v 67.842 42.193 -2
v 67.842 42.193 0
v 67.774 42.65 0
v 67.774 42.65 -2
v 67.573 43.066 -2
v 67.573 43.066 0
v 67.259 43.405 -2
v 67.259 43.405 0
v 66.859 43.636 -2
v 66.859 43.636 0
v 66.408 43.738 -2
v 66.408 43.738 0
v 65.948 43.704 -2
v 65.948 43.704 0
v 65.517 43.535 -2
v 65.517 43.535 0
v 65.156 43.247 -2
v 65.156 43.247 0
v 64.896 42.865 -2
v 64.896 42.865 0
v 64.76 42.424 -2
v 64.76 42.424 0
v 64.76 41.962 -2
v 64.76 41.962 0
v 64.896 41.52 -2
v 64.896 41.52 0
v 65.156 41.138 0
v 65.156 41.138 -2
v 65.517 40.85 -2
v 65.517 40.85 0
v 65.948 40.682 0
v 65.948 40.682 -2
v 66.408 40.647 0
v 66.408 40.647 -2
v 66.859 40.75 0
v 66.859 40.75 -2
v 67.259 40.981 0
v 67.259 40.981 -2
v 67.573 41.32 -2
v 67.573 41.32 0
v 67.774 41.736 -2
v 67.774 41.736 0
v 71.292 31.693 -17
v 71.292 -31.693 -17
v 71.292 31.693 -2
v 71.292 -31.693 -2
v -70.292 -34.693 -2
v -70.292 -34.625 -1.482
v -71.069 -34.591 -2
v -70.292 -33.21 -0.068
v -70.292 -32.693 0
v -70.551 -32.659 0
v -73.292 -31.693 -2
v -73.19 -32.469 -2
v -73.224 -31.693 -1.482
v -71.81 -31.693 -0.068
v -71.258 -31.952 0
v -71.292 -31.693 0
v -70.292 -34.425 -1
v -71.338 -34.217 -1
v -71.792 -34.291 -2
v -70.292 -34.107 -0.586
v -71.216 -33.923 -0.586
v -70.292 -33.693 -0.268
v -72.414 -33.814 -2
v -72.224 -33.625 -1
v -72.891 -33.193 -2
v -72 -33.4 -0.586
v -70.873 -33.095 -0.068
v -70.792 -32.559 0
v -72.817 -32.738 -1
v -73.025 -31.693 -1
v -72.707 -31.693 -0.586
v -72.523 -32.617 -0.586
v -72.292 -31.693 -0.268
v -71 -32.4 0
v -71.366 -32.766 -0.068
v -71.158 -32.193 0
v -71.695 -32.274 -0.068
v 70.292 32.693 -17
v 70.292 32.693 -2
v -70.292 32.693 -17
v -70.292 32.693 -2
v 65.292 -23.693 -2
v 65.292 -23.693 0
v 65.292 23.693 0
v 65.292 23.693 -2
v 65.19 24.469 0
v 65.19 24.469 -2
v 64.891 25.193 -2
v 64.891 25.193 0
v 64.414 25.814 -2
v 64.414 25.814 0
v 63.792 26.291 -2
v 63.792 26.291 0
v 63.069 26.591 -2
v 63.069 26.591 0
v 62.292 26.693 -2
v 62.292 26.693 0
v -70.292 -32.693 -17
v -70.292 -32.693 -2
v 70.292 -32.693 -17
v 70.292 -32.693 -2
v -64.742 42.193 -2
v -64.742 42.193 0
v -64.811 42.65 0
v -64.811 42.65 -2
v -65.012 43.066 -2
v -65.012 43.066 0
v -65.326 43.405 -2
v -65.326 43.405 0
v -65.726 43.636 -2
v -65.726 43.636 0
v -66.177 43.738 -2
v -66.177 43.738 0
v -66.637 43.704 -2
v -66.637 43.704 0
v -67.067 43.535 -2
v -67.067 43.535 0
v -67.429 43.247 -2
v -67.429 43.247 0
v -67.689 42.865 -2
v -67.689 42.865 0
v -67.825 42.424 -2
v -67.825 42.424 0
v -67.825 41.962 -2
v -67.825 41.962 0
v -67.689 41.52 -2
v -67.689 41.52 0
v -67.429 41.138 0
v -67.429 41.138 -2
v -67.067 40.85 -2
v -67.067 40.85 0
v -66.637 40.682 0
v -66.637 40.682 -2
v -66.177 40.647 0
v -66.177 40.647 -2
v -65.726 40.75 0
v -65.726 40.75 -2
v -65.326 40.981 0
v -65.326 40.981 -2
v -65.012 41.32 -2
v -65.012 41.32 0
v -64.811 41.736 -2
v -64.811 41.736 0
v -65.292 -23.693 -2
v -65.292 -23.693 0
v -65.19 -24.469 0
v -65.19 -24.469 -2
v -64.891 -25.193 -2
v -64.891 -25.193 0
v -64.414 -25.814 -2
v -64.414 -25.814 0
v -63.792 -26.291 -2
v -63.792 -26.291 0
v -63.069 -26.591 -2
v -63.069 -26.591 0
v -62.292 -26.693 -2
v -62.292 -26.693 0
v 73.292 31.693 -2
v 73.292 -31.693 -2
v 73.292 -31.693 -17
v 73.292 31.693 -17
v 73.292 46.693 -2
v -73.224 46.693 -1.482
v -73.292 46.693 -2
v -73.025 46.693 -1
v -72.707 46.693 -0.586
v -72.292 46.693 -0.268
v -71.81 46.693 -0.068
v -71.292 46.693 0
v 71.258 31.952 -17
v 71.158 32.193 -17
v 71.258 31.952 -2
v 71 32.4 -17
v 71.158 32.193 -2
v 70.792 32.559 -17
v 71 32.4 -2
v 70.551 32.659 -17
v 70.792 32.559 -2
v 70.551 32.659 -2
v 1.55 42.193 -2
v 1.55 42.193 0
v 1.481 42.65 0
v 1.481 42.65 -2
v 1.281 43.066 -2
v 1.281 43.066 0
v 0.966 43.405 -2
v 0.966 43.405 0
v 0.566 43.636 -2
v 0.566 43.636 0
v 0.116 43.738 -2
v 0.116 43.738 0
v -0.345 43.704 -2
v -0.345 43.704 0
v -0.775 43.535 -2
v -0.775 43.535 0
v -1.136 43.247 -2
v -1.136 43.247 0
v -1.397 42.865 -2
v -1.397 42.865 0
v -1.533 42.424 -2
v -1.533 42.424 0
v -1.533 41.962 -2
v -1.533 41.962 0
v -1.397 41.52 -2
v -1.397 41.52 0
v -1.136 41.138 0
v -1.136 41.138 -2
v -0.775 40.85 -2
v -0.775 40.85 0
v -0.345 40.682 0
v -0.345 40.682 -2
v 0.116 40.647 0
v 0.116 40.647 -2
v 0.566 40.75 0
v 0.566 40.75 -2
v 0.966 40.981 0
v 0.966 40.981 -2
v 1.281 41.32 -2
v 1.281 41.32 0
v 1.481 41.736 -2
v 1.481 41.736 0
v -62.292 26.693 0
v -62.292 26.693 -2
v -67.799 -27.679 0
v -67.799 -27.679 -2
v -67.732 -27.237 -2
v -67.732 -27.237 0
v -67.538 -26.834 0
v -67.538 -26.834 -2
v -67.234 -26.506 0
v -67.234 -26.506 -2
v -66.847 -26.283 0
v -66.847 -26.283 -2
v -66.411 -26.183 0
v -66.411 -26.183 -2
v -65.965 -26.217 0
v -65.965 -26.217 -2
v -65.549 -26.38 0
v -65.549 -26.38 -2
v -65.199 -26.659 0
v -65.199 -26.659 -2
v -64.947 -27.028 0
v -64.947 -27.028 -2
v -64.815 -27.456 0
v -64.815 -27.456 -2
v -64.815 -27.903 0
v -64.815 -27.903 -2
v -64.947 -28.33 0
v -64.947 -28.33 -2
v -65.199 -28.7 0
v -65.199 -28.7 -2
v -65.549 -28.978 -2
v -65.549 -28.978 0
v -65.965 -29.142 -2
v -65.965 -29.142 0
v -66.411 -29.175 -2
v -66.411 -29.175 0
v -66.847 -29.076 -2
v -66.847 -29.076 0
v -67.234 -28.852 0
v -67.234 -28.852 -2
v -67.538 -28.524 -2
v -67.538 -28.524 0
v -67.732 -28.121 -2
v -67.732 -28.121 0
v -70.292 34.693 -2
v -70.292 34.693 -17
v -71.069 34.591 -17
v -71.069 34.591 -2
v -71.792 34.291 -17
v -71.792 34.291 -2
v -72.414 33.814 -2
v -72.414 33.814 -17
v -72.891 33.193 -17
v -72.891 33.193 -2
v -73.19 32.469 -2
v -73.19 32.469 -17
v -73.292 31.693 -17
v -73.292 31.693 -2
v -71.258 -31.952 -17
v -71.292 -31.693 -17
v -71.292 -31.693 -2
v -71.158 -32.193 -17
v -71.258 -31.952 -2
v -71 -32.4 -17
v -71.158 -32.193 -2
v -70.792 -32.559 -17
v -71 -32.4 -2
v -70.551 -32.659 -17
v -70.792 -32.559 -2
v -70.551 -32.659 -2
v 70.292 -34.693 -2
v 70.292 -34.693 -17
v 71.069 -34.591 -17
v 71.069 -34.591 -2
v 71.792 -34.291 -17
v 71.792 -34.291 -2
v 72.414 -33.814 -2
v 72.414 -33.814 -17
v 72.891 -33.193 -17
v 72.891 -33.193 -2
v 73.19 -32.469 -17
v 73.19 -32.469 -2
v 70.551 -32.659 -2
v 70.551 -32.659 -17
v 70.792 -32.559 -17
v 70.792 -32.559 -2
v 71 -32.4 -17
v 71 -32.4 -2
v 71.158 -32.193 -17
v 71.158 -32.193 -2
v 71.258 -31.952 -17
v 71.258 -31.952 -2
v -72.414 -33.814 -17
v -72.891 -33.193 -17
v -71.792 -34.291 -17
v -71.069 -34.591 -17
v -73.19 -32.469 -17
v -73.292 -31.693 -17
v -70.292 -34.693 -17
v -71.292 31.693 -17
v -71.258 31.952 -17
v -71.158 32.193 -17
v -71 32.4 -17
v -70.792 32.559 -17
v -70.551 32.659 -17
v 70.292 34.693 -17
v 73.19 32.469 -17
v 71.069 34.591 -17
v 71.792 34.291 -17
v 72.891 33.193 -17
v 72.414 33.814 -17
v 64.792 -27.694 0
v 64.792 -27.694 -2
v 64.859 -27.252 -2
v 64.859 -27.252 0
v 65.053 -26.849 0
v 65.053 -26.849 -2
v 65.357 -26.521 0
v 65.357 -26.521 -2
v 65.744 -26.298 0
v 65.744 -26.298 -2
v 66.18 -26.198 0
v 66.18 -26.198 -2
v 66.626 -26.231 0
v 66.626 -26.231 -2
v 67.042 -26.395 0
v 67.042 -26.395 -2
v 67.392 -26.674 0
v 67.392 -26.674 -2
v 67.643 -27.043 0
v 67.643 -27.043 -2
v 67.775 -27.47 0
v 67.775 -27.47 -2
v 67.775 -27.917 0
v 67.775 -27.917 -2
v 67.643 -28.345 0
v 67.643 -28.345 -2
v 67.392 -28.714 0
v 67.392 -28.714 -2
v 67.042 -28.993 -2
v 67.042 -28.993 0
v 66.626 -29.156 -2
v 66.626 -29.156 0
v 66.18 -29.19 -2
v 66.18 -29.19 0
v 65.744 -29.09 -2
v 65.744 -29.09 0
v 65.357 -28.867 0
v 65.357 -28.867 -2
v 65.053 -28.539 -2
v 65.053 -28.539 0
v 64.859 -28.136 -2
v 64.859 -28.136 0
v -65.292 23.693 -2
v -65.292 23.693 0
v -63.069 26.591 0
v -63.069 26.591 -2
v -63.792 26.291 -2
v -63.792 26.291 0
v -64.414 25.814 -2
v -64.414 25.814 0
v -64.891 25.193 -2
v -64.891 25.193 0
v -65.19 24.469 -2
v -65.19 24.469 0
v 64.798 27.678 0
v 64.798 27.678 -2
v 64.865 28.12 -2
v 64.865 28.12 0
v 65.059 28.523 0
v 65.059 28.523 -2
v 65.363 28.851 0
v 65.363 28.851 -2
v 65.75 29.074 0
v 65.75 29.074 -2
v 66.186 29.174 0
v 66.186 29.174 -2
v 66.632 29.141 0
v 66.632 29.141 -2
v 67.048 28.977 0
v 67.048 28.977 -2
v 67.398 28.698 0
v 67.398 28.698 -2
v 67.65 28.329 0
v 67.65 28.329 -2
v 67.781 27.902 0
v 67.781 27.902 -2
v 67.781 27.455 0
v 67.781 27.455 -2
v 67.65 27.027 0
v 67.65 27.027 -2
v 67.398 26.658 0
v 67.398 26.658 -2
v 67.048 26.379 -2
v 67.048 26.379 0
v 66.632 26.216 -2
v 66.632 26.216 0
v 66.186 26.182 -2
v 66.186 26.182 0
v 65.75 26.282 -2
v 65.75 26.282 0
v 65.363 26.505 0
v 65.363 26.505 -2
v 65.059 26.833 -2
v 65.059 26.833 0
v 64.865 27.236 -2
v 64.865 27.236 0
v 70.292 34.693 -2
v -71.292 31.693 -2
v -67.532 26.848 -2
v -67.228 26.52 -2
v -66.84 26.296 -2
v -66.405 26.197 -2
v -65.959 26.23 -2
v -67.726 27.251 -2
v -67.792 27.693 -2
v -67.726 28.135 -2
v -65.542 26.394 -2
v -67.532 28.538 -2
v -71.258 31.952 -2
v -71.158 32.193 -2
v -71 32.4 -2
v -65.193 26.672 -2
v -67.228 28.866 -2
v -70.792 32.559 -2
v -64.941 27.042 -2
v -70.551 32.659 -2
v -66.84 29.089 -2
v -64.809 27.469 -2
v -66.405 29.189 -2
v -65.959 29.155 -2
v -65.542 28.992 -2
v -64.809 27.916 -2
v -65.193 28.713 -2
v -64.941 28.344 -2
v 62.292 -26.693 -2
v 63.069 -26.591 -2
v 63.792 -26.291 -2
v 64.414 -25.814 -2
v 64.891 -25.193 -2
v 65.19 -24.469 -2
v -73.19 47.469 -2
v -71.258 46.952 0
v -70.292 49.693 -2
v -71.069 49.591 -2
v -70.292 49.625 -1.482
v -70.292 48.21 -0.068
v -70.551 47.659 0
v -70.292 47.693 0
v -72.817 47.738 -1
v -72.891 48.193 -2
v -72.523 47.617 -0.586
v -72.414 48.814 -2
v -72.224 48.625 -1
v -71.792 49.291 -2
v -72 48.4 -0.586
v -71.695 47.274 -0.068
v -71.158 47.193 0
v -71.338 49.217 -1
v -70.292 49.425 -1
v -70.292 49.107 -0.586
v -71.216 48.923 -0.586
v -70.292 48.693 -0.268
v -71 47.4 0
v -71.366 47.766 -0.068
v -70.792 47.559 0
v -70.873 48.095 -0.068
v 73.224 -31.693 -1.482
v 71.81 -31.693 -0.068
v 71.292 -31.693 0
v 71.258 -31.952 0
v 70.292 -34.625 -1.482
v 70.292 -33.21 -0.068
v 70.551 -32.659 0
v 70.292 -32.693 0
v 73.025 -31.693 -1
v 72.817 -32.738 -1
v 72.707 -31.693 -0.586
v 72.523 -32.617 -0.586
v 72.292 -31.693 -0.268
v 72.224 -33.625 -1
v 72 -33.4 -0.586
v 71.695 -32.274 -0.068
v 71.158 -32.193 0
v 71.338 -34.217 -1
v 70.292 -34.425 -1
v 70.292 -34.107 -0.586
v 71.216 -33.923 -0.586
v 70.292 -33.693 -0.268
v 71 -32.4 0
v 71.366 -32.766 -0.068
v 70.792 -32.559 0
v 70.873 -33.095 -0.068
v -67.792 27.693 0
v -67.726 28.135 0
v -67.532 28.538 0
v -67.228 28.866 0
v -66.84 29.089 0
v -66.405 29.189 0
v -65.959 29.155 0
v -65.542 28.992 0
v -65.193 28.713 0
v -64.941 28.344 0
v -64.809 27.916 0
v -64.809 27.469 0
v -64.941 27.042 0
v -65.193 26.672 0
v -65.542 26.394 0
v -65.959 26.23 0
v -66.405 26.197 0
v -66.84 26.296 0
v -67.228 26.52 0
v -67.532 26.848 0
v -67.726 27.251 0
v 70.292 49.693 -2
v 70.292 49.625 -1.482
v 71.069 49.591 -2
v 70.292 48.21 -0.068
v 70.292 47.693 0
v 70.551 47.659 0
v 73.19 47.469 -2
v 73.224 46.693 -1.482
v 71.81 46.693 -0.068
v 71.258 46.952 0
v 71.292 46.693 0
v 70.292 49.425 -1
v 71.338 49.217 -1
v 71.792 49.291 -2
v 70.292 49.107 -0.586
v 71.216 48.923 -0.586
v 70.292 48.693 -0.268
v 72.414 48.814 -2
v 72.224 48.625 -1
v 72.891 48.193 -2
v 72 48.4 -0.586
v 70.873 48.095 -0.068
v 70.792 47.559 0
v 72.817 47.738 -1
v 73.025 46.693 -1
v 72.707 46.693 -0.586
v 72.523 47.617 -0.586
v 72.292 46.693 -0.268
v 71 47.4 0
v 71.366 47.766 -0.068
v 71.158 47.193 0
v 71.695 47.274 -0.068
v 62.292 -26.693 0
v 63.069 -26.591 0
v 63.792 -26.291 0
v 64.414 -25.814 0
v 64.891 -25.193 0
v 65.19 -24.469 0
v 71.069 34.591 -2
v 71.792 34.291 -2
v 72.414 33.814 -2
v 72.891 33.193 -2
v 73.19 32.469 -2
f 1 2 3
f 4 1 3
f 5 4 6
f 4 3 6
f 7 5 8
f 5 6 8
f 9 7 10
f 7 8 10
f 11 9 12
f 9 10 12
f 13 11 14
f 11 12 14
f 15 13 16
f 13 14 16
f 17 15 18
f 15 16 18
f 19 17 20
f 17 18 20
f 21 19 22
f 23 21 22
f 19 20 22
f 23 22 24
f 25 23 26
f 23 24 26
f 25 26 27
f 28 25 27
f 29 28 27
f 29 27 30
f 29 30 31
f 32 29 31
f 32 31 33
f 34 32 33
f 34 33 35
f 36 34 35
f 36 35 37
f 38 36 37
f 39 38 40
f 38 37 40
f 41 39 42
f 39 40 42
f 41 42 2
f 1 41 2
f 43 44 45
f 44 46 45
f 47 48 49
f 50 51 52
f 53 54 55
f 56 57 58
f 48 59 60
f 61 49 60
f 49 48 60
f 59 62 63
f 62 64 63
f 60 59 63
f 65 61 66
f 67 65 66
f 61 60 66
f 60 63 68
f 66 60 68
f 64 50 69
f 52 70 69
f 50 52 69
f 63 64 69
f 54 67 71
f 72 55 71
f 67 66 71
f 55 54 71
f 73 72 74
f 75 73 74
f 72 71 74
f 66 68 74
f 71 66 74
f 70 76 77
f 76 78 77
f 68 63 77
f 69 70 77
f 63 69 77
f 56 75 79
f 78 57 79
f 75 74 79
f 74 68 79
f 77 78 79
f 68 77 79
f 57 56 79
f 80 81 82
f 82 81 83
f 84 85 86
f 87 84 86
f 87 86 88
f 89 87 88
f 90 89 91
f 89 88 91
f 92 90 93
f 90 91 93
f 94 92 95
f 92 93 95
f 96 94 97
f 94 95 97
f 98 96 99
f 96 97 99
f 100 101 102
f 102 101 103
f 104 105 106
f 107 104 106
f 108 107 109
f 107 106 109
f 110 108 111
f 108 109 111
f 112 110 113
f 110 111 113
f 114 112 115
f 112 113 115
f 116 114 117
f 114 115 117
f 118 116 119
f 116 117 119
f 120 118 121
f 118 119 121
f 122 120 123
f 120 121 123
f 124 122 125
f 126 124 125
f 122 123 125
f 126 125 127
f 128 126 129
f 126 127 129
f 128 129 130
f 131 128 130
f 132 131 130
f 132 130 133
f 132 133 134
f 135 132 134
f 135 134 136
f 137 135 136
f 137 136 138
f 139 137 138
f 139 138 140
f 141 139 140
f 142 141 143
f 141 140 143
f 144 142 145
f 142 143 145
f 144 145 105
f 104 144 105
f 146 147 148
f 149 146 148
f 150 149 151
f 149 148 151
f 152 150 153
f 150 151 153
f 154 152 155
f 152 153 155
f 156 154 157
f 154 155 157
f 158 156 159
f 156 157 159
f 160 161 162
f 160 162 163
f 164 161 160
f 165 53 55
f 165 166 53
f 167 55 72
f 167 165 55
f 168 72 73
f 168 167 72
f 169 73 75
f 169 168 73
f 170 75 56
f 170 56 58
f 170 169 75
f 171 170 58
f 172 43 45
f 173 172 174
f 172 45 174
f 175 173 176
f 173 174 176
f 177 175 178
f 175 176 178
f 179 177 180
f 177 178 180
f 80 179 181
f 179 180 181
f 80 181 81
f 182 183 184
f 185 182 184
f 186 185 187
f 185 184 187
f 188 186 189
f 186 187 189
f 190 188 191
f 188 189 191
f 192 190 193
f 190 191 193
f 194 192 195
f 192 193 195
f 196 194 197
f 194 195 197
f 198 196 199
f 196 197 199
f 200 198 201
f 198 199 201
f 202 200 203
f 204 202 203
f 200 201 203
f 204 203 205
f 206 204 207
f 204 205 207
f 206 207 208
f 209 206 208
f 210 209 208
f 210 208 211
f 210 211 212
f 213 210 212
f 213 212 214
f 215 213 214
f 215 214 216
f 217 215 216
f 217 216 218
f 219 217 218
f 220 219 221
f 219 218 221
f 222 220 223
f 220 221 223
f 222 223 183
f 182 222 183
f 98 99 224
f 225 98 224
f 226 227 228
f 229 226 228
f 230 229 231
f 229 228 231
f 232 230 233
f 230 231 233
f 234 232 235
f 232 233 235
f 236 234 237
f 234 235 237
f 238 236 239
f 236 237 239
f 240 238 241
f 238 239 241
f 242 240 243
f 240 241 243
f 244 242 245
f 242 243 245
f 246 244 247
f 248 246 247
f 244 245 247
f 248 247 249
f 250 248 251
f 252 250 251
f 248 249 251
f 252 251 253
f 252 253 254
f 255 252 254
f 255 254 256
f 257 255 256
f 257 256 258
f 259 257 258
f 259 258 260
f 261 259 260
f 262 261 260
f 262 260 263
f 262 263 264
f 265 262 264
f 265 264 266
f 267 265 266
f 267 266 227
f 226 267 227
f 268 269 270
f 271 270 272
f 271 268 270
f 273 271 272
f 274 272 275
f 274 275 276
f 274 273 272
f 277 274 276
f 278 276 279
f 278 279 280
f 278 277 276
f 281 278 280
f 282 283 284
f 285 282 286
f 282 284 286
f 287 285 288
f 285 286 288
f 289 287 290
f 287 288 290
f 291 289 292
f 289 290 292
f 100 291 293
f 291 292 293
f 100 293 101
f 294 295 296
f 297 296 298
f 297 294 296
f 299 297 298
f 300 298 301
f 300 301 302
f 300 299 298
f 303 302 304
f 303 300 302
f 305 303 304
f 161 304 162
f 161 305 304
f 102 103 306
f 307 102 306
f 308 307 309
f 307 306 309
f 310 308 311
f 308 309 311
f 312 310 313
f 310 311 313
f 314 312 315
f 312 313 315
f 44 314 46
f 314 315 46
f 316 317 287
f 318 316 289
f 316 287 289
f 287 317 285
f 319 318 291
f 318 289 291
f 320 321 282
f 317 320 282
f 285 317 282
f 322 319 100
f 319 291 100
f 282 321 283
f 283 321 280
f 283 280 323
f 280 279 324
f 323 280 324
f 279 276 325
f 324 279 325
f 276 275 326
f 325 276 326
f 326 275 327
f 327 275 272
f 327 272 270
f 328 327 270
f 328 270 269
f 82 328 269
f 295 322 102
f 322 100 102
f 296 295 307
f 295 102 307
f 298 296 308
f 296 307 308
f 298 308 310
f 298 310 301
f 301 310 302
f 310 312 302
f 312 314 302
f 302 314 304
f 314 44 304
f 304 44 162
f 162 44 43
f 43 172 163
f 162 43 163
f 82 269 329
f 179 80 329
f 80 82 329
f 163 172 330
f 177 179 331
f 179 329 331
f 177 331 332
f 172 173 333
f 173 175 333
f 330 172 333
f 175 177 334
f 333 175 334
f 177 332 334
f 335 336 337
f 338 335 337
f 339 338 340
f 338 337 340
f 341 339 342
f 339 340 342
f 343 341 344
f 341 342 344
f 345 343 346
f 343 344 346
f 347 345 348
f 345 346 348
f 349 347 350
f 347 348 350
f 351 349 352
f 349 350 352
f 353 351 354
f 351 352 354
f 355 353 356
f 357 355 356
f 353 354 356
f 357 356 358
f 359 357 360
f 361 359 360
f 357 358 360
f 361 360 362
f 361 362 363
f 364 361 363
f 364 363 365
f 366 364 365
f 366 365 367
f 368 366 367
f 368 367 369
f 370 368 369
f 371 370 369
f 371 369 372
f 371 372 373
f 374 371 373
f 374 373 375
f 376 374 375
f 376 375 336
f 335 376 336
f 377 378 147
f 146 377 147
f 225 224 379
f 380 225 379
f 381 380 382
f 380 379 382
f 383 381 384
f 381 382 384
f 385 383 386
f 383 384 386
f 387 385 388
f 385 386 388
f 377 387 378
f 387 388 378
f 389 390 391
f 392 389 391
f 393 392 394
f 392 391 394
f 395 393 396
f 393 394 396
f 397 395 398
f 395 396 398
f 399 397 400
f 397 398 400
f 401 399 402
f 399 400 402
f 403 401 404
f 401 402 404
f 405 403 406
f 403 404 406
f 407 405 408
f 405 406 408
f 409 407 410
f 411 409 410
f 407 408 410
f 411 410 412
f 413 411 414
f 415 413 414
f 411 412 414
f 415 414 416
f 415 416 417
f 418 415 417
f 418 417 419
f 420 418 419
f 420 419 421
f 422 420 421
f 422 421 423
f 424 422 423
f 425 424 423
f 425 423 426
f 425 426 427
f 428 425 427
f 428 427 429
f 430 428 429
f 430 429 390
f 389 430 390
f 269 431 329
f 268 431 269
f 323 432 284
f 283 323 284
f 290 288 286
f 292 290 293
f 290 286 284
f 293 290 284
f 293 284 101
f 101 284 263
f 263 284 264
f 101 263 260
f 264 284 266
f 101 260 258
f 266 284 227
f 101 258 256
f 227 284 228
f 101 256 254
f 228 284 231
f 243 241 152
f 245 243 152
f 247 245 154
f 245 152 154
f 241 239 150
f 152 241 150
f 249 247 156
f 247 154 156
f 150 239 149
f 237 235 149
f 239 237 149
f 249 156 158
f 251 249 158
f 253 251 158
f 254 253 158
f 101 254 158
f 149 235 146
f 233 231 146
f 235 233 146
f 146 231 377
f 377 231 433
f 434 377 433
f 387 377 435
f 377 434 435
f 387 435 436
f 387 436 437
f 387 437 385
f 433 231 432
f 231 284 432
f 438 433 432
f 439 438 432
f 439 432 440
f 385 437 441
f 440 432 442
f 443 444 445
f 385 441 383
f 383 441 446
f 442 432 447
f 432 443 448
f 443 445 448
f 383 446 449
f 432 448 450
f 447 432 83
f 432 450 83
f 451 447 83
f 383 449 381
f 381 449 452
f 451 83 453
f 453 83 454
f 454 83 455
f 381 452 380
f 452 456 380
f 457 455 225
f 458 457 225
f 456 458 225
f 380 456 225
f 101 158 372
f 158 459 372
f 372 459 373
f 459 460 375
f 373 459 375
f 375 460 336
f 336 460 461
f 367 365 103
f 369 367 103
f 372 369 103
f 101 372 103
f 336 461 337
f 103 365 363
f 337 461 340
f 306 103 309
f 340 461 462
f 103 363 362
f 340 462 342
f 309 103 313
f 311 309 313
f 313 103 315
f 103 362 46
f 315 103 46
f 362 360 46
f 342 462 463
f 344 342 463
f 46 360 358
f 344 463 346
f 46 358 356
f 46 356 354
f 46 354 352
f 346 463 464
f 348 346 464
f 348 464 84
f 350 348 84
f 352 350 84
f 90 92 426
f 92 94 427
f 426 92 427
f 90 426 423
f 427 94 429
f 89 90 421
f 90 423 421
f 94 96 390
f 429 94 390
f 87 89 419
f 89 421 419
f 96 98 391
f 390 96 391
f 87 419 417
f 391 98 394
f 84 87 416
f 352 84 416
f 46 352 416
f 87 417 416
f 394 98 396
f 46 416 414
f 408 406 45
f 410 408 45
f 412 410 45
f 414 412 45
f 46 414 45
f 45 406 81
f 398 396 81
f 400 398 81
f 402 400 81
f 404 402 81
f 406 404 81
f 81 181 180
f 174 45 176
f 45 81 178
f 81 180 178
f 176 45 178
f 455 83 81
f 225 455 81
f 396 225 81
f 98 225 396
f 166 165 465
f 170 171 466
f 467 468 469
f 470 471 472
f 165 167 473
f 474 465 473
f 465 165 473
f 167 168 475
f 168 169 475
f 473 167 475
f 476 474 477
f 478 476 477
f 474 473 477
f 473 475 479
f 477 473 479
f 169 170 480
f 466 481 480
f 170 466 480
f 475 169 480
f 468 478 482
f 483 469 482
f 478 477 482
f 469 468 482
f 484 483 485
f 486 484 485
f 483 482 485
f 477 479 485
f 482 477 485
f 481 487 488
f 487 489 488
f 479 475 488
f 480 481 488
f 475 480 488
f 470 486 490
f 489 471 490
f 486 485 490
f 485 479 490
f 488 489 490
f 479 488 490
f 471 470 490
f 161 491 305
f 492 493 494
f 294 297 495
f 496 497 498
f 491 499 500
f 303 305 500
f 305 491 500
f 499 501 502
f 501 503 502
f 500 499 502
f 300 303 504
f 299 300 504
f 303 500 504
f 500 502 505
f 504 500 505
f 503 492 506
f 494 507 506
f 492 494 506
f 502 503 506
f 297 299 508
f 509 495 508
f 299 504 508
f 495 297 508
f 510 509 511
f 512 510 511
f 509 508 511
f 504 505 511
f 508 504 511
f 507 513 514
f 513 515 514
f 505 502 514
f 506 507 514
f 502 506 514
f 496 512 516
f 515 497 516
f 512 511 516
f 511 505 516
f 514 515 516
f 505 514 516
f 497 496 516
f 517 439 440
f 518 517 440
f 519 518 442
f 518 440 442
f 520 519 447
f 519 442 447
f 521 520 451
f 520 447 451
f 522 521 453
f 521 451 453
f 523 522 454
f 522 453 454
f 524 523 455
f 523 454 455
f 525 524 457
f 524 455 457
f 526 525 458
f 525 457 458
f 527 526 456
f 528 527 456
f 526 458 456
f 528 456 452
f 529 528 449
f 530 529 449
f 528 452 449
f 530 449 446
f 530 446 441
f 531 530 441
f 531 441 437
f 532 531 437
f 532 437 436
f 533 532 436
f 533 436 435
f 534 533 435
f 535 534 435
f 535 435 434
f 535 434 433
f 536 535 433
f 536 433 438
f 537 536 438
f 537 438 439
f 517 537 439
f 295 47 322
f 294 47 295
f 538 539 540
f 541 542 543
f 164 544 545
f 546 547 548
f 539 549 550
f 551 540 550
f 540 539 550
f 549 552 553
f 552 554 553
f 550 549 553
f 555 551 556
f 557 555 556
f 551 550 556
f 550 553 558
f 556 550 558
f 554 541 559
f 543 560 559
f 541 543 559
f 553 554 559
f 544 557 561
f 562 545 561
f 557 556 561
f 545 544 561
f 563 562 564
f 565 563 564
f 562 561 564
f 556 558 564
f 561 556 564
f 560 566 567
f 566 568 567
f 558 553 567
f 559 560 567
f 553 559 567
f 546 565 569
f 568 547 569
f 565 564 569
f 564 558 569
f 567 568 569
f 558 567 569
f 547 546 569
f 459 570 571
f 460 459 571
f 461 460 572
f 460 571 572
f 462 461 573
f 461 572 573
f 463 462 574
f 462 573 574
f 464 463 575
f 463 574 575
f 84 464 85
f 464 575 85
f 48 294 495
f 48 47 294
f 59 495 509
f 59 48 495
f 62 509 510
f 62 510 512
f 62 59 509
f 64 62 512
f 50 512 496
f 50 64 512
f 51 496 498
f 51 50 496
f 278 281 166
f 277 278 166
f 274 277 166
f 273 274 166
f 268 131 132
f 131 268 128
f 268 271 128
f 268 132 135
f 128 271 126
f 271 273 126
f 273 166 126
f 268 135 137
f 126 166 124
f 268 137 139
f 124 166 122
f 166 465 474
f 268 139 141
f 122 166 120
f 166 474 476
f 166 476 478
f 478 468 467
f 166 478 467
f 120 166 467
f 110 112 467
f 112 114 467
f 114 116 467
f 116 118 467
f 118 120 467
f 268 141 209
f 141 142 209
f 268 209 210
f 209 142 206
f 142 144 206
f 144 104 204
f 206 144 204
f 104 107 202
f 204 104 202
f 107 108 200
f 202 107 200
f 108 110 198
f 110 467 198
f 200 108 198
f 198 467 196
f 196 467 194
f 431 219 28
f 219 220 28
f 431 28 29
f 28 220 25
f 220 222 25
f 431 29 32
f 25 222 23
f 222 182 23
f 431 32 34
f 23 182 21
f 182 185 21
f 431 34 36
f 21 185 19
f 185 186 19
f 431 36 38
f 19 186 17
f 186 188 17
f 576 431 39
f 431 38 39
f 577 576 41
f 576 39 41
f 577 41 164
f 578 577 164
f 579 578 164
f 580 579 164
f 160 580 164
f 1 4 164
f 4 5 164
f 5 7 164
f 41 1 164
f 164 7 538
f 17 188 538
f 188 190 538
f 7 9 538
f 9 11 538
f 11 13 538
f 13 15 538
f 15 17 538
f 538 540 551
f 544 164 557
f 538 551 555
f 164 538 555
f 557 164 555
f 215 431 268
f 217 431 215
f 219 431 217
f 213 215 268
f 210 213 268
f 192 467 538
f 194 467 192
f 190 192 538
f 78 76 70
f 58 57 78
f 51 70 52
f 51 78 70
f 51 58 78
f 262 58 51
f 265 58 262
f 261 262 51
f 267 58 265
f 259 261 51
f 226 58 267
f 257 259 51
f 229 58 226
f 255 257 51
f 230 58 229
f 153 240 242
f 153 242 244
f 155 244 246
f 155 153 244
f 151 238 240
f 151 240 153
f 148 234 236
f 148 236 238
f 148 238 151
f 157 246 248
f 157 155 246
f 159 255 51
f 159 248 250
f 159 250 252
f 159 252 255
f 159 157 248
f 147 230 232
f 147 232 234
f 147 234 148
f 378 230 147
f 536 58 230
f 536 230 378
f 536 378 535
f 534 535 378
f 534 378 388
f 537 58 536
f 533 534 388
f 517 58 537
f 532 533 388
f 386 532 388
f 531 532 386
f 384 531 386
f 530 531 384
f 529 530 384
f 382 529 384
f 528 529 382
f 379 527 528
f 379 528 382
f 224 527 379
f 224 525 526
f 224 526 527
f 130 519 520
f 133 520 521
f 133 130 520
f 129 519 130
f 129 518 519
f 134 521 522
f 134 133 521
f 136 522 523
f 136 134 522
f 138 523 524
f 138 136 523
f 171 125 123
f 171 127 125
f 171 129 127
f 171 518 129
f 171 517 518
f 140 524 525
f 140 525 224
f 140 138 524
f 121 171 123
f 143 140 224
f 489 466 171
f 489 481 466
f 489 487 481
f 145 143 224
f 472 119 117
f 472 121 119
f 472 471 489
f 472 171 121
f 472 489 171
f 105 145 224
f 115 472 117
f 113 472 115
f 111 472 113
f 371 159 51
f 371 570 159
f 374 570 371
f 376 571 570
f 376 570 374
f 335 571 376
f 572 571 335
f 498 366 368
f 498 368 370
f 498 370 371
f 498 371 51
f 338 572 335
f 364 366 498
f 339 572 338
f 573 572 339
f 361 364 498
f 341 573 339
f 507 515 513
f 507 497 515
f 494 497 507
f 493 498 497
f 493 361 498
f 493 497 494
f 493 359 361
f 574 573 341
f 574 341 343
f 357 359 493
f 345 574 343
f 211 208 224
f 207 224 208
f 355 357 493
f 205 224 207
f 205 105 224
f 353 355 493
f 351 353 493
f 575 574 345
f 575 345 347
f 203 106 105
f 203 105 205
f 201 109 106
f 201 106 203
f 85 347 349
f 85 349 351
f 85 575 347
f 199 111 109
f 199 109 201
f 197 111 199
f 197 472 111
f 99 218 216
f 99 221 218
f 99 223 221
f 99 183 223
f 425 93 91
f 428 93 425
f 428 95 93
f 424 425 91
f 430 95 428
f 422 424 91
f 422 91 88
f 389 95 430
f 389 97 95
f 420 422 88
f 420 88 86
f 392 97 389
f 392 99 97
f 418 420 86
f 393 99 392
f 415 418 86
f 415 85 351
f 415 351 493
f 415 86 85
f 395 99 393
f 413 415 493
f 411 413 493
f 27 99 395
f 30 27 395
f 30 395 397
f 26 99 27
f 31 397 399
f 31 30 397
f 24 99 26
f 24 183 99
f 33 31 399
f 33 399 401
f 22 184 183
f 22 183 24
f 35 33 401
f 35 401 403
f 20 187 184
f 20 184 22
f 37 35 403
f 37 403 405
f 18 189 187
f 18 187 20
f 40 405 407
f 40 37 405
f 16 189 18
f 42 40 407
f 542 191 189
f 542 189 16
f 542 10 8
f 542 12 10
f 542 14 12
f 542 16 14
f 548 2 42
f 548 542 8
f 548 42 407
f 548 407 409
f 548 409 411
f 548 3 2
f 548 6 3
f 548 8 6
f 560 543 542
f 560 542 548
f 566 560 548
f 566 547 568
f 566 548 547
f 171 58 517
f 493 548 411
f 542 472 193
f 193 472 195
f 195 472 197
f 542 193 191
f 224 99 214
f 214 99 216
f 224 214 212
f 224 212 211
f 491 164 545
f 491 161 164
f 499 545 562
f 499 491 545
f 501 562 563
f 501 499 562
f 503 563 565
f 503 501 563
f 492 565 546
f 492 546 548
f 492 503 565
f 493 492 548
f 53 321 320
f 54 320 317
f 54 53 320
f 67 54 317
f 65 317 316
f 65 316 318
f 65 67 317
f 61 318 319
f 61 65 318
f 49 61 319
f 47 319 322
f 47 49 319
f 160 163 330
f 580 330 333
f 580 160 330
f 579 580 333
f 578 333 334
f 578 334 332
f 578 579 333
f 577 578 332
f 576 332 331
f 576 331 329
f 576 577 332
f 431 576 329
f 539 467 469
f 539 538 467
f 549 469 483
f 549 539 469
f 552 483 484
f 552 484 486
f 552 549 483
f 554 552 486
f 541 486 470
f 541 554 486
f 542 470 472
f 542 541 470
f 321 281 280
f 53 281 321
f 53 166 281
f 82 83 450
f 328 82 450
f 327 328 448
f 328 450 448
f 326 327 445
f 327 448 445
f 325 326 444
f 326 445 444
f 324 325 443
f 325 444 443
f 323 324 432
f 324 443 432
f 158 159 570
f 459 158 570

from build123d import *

# Parameters (mm, degrees)
F2_DEPTH = 17
F3_T     = -2
F1_R     = 1.55
F4_DEPTH = 2
F5_DEPTH = 25
F6_D     = 3
F7_R     = 1.99999


# Not quite as in the source:
# - a fillet or chamfer is up to 0.001 mm smaller than in the source, because OpenCascade refuses the exact size


with BuildPart() as f2:
    # F1 (on Top) → F2 (new body)
    with BuildSketch(Plane.XY):
        with BuildLine():
            ThreePointArc((73.2924652381, 31.6927541938), (72.4137855817, 33.8140745374), (70.2924652381, 34.6927541938))
            Line((70.2924652381, 34.6927541938), (-70.2924652381, 34.6927541938))
            ThreePointArc((-70.2924652381, 34.6927541938), (-72.4137855817, 33.8140745374), (-73.2924652381, 31.6927541938))
            Line((-73.2924652381, 31.6927541938), (-73.2924652381, -31.6927541938))
            ThreePointArc((-73.2924652381, -31.6927541938), (-72.4137855817, -33.8140745374), (-70.2924652381, -34.6927541938))
            Line((-70.2924652381, -34.6927541938), (70.2924652381, -34.6927541938))
            ThreePointArc((70.2924652381, -34.6927541938), (72.4137855817, -33.8140745374), (73.2924652381, -31.6927541938))
            Line((73.2924652381, -31.6927541938), (73.2924652381, 31.6927541938))
        make_face()
        with BuildLine():
            ThreePointArc((65.2924652381, -23.6927541938), (64.4137855817, -25.8140745374), (62.2924652381, -26.6927541938))
            Line((62.2924652381, -26.6927541938), (-62.2924652381, -26.6927541938))
            ThreePointArc((-62.2924652381, -26.6927541938), (-64.4137855817, -25.8140745374), (-65.2924652381, -23.6927541938))
            Line((-65.2924652381, -23.6927541938), (-65.2924652381, 23.6927541938))
            ThreePointArc((-65.2924652381, 23.6927541938), (-64.4137855817, 25.8140745374), (-62.2924652381, 26.6927541938))
            Line((-62.2924652381, 26.6927541938), (62.2924652381, 26.6927541938))
            ThreePointArc((62.2924652381, 26.6927541938), (64.4137855817, 25.8140745374), (65.2924652381, 23.6927541938))
            Line((65.2924652381, 23.6927541938), (65.2924652381, -23.6927541938))
        make_face(mode=Mode.SUBTRACT)
        with BuildLine():
            Line((-62.2924652381, -26.6927541938), (62.2924652381, -26.6927541938))
            ThreePointArc((62.2924652381, -26.6927541938), (64.4137855817, -25.8140745374), (65.2924652381, -23.6927541938))
            Line((65.2924652381, -23.6927541938), (65.2924652381, 23.6927541938))
            ThreePointArc((65.2924652381, 23.6927541938), (64.4137855817, 25.8140745374), (62.2924652381, 26.6927541938))
            Line((62.2924652381, 26.6927541938), (-62.2924652381, 26.6927541938))
            ThreePointArc((-62.2924652381, 26.6927541938), (-64.4137855817, 25.8140745374), (-65.2924652381, 23.6927541938))
            Line((-65.2924652381, 23.6927541938), (-65.2924652381, -23.6927541938))
            ThreePointArc((-65.2924652381, -23.6927541938), (-64.4137855817, -25.8140745374), (-62.2924652381, -26.6927541938))
        make_face()
    extrude(amount=-F2_DEPTH)

    # F3
    f3_openings = [f2.faces().sort_by_distance(p)[0] for p in [
        (0, 0, -17),
    ]]
    offset(amount=F3_T, openings=f3_openings)

    # F1 (on Top) → F4 (join)
    with BuildSketch(Plane.XY):
        with BuildLine():
            Line((-70.2924652381, 34.6927541938), (70.2924652381, 34.6927541938))
            ThreePointArc((70.2924652381, 34.6927541938), (72.4137855817, 33.8140745374), (73.2924652381, 31.6927541938))
            Line((73.2924652381, 31.6927541938), (73.2924652381, 34.6927541938))
            Line((73.2924652381, 34.6927541938), (73.2924652381, 46.6927541938))
            ThreePointArc((73.2924652381, 46.6927541938), (72.4137855817, 48.8140745374), (70.2924652381, 49.6927541938))
            Line((70.2924652381, 49.6927541938), (-70.2924652381, 49.6927541938))
            ThreePointArc((-70.2924652381, 49.6927541938), (-72.4137855817, 48.8140745374), (-73.2924652381, 46.6927541938))
            Line((-73.2924652381, 46.6927541938), (-73.2924652381, 34.6927541938))
            Line((-73.2924652381, 34.6927541938), (-73.2924652381, 31.6927541938))
            ThreePointArc((-73.2924652381, 31.6927541938), (-72.4137855817, 33.8140745374), (-70.2924652381, 34.6927541938))
        make_face()
        with Locations((-66.2924652381, 42.1927541938)):
            Circle(F1_R, mode=Mode.SUBTRACT)
        with Locations((0, 42.1927541938)):
            Circle(F1_R, mode=Mode.SUBTRACT)
        with Locations((66.2924652381, 42.1927541938)):
            Circle(F1_R, mode=Mode.SUBTRACT)
    extrude(amount=-F4_DEPTH)

    # F1 (on Top) → F5 (cut)
    with BuildSketch(Plane.XY):
        with BuildLine():
            Line((-62.2924652381, -26.6927541938), (62.2924652381, -26.6927541938))
            ThreePointArc((62.2924652381, -26.6927541938), (64.4137855817, -25.8140745374), (65.2924652381, -23.6927541938))
            Line((65.2924652381, -23.6927541938), (65.2924652381, 23.6927541938))
            ThreePointArc((65.2924652381, 23.6927541938), (64.4137855817, 25.8140745374), (62.2924652381, 26.6927541938))
            Line((62.2924652381, 26.6927541938), (-62.2924652381, 26.6927541938))
            ThreePointArc((-62.2924652381, 26.6927541938), (-64.4137855817, 25.8140745374), (-65.2924652381, 23.6927541938))
            Line((-65.2924652381, 23.6927541938), (-65.2924652381, -23.6927541938))
            ThreePointArc((-65.2924652381, -23.6927541938), (-64.4137855817, -25.8140745374), (-62.2924652381, -26.6927541938))
        make_face()
    extrude(amount=-F5_DEPTH, mode=Mode.SUBTRACT)

    # F6 (through all)
    with Locations(Plane.XY):
        with Locations((-66.2924652381, 27.6927541938), (66.2980739571, 27.6781461437), (66.291973394, -27.6938535203), (-66.2985658012, -27.6792454701)):
            Hole(F6_D / 2)

    # F7 (radius 2 in the source; OpenCascade refuses exactly that, so slightly less here)
    f7_edges = [f2.edges().sort_by_distance(p)[0] for p in [
        (-73.292465, 7.5, 0),
    ]]
    fillet(f7_edges, radius=F7_R)


solid = f2.part
